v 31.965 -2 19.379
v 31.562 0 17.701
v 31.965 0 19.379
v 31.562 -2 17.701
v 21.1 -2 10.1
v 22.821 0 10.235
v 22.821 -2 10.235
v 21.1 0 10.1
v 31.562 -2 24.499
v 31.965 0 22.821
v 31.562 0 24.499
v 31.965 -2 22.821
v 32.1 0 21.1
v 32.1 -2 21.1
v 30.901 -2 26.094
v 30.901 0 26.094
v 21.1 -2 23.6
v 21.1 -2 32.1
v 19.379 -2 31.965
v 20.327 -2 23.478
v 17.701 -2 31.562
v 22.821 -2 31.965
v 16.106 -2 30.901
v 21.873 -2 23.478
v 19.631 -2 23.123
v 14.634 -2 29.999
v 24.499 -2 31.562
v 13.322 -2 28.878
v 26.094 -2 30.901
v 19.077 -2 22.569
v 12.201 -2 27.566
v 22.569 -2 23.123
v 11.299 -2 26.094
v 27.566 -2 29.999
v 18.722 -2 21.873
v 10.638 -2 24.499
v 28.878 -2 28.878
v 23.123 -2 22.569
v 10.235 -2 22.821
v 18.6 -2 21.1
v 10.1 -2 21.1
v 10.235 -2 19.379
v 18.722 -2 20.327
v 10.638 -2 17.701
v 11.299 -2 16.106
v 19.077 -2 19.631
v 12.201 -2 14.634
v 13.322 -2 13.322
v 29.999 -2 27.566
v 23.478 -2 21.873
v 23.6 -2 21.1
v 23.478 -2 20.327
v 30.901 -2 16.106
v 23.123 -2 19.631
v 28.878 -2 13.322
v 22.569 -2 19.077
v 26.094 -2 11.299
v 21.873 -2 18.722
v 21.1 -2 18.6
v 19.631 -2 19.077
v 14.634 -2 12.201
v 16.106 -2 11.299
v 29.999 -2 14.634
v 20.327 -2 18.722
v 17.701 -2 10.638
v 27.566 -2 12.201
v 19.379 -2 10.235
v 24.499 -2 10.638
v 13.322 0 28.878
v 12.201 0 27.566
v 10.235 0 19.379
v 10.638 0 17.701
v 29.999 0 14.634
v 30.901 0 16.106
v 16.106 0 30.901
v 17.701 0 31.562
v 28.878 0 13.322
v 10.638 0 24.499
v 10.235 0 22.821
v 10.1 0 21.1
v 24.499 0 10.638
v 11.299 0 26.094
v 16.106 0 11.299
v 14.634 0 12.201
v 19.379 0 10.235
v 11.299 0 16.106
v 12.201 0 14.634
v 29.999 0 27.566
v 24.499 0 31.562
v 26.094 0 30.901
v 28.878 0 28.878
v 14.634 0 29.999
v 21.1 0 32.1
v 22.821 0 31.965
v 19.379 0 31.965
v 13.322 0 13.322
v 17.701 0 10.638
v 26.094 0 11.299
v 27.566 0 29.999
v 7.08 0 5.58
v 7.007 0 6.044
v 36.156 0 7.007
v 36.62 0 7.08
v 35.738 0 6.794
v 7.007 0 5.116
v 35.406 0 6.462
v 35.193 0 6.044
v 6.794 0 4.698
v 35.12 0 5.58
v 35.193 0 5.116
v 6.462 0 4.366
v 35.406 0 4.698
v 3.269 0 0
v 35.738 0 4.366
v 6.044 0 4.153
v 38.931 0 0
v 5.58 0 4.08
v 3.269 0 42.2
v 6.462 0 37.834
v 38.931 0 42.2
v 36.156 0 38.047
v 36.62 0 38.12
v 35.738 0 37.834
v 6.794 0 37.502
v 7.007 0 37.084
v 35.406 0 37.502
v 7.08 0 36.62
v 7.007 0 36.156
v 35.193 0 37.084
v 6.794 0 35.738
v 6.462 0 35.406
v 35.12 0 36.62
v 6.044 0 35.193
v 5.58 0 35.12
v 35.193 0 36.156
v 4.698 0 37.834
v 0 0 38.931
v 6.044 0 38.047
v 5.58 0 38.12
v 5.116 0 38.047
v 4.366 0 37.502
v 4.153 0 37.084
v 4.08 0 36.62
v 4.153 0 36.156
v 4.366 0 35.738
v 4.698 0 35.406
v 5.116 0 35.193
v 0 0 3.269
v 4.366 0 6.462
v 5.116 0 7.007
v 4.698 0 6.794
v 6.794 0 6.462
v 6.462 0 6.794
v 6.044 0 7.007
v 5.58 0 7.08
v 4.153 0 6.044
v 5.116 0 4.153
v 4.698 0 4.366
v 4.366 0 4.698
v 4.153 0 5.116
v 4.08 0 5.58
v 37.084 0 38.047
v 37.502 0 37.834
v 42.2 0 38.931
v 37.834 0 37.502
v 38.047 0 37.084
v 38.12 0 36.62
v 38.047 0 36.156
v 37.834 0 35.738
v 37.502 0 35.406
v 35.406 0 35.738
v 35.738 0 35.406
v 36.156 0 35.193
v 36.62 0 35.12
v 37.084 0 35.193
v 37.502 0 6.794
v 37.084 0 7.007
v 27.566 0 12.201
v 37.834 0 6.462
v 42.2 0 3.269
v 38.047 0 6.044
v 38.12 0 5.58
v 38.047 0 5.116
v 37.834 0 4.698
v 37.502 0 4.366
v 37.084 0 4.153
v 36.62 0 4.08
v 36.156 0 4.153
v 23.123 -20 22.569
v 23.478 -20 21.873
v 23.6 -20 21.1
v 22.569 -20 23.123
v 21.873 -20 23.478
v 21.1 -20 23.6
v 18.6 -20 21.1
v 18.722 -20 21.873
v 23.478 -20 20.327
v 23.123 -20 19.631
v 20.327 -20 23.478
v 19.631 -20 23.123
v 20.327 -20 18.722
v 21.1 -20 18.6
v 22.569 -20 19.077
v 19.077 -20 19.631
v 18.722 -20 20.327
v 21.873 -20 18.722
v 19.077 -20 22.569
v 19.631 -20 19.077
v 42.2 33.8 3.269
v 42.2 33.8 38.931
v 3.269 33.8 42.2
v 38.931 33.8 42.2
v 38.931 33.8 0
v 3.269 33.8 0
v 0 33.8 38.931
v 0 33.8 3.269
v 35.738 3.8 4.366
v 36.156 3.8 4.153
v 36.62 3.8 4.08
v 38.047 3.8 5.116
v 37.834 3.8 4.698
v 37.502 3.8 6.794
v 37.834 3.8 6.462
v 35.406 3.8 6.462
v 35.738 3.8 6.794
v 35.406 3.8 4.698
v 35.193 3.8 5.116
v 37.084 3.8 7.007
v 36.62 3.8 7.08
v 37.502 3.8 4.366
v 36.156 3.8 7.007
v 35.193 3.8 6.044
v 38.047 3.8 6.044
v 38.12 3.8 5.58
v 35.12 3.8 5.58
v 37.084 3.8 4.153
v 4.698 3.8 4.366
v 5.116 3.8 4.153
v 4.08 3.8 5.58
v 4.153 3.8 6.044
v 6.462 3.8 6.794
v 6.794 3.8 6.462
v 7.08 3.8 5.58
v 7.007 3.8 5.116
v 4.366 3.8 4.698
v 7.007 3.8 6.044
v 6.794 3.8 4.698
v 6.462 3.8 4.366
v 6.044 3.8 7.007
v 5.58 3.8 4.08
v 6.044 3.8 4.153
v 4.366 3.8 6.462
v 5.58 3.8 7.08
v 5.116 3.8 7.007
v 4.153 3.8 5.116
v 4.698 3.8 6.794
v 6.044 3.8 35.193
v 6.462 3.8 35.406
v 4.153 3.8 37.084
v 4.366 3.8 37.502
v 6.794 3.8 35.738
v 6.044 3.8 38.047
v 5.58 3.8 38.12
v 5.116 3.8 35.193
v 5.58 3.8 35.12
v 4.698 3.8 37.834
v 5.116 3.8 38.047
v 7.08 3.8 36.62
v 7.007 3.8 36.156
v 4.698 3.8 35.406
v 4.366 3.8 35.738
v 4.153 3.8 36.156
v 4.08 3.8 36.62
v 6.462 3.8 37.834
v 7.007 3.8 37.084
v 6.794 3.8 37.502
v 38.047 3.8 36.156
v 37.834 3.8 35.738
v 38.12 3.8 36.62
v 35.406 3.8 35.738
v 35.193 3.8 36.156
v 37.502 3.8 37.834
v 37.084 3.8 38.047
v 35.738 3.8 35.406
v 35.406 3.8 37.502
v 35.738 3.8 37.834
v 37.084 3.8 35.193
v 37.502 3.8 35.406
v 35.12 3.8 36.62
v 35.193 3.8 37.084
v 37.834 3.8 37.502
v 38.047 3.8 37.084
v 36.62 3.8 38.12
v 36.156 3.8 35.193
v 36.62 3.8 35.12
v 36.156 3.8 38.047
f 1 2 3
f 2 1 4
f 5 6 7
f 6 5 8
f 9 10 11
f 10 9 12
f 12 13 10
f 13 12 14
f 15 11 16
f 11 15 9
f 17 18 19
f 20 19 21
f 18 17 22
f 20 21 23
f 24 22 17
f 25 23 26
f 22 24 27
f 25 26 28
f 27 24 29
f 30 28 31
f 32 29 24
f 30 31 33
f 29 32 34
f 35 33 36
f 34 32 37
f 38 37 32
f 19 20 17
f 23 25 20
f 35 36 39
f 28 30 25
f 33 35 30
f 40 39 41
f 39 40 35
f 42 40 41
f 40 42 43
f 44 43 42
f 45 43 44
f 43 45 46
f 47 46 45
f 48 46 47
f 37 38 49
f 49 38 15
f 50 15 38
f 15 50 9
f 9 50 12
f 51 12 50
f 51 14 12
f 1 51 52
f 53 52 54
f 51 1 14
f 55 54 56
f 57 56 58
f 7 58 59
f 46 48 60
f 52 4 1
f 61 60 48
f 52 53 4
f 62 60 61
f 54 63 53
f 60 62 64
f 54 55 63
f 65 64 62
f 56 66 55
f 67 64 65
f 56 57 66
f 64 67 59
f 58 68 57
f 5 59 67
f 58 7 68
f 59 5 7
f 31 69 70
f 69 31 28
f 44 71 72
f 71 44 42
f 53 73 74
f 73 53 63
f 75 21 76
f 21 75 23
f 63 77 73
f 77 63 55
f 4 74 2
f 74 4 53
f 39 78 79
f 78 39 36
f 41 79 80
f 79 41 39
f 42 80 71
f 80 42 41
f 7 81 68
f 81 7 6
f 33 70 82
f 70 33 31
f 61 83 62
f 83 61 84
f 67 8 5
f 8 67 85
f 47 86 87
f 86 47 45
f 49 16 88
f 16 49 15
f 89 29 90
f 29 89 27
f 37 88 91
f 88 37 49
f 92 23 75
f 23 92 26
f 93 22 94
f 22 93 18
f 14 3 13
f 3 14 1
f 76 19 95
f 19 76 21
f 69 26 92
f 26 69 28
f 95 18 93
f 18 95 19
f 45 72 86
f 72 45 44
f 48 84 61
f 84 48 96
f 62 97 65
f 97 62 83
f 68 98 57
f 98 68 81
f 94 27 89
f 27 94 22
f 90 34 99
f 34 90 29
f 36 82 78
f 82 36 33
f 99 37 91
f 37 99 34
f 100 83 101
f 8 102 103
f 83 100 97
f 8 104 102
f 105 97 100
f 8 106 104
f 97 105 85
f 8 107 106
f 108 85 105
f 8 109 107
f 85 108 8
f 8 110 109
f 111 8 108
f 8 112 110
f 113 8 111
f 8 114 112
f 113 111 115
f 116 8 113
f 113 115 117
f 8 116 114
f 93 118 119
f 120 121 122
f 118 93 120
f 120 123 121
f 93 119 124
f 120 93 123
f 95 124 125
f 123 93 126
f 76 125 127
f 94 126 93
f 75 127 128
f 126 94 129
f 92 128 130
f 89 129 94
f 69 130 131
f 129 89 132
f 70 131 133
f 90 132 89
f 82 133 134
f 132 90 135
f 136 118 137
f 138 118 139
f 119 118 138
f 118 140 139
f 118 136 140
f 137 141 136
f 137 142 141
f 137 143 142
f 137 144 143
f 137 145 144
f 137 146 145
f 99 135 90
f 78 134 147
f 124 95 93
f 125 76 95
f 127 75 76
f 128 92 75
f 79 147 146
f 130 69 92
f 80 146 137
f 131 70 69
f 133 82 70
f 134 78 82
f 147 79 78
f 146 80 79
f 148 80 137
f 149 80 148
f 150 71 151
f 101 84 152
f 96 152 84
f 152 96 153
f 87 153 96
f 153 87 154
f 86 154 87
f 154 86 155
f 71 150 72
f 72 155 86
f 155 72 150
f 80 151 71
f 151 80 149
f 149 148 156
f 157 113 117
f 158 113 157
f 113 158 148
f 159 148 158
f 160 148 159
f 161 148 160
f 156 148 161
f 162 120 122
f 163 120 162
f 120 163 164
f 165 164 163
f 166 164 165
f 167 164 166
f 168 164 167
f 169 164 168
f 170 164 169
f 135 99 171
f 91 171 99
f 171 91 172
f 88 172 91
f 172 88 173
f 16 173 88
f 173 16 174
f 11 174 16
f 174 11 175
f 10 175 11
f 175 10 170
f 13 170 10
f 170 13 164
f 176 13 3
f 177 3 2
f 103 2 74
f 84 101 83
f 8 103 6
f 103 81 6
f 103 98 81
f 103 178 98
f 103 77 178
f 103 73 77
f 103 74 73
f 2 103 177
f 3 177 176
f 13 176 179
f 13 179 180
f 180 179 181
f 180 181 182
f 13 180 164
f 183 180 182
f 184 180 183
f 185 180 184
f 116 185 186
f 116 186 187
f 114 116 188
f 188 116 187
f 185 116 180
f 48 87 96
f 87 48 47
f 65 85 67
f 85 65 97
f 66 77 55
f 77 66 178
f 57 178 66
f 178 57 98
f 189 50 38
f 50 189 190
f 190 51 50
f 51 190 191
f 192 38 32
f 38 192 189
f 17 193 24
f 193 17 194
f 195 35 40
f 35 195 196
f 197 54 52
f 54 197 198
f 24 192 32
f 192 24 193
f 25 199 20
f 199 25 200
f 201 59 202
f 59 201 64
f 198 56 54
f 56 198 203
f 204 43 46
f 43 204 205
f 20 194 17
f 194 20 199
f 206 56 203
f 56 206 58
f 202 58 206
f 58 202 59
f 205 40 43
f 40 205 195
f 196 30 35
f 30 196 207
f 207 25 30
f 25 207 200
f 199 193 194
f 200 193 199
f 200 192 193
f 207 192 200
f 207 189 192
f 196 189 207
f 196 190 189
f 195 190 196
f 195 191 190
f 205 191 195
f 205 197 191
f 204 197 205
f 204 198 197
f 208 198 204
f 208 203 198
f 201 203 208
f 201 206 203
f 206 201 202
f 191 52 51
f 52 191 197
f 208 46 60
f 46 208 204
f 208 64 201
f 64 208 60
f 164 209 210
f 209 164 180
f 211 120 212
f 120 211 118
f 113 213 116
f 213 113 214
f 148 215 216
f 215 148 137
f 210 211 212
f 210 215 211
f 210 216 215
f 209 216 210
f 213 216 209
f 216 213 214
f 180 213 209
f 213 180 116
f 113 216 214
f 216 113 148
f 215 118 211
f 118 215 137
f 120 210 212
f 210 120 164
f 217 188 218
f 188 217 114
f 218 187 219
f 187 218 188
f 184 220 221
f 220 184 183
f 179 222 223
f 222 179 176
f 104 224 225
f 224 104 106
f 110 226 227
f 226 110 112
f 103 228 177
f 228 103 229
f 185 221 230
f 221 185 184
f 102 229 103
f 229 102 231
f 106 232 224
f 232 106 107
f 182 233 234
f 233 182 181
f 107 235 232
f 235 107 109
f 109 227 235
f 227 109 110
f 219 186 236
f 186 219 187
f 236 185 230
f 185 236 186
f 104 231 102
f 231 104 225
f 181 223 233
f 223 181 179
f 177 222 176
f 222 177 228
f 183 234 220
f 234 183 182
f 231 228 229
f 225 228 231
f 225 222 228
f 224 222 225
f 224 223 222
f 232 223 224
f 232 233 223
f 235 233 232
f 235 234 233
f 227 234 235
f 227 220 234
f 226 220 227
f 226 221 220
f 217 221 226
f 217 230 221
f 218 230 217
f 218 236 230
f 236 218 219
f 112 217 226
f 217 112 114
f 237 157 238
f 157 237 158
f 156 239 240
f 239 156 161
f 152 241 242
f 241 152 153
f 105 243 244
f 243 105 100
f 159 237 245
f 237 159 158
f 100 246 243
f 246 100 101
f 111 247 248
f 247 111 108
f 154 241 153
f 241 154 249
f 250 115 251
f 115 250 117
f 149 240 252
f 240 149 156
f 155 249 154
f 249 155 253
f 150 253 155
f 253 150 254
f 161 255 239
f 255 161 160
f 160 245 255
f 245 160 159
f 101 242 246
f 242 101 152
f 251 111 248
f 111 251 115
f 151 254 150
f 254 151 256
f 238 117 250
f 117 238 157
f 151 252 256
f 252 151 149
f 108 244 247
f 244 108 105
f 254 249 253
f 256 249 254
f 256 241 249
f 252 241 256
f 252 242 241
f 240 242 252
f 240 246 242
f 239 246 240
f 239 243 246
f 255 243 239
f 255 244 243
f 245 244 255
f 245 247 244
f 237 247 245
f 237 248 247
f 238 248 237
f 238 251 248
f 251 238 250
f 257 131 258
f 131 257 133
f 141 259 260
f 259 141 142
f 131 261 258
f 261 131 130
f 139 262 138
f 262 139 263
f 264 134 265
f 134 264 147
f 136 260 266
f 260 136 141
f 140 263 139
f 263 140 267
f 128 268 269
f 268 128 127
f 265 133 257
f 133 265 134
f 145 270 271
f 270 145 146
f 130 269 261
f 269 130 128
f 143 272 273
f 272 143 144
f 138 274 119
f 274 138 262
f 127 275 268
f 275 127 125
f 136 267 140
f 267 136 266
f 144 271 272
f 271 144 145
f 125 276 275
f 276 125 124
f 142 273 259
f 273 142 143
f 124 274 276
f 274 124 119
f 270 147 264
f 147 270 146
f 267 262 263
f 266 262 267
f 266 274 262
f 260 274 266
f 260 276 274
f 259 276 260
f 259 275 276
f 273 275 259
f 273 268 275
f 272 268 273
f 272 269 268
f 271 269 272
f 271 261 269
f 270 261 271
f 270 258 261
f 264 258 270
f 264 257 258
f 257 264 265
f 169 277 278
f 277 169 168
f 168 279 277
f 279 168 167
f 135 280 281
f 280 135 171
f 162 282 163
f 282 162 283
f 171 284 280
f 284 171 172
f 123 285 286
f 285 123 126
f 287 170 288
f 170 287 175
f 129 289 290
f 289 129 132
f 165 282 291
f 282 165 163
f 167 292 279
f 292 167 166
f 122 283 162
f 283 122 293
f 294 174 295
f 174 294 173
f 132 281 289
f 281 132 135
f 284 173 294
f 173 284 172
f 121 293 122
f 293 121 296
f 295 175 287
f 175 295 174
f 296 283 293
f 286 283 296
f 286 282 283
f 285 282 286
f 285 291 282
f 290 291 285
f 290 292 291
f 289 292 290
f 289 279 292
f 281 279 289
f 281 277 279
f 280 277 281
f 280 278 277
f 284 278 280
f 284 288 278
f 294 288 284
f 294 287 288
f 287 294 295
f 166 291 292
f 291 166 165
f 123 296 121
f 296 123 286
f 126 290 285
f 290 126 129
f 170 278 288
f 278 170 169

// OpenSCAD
// file: nema17.scad
module Nema17()
{
	nema_side = 42.2;
	nema_bolts = 31.04/2.0;
	nema_depth = 3.8;
	M3 = 3.0/2.0;

	//bevel corners
	r1 = nema_side/2- nema_bolts;
	r2 = sqrt(2)* r1 ;
	r=(r2-r1)*2;
	
	
	difference()
	{
	
		union()
		{
			cube([nema_side,33.8,nema_side]);
	
			translate( [nema_side/2,0,nema_side/2]) 
				rotate(90,[1,0,0]) 
					{
						cylinder(r = 11, h = 2, $fn = 40);
						cylinder(r = 5.0/2.0, h = 20, $fn = 20);
					}
		}
	
	
		translate( [nema_side/2,0,nema_side/2])
		{
	
			for(j=[1:4])
			{
				rotate(90*j,[0,1,0]) 
					translate( [nema_side/2,33.8/2,nema_side/2]) 
				rotate(45,[0,1,0]) 
				cube([30,50,r], center = true);
			}
	
			//bolt holes
			for(j=[1:4])
			{		
				rotate(90*j,[0,1,0]) 
				translate( [nema_bolts,0,nema_bolts]) 
					rotate(-90,[1,0,0]) 
					{
						cylinder(r = M3, h = nema_depth*2, $fn = 20,center=true);
					}
	
			}
		}
	}
}
	
	
Nema17();
// main file
//delta.scad

// 2020 extrusion params
alu_height = 7500;
alu_length = 250;

// linear rod
lienarRod_height = 500;
linearRod_distance = 75;


module aluExtrusion(height) {
    //temp..
    translate([0,0,height/2]) cube([20,20,height], center=true);
}

use <nema17.scad>;

module vertex()
{
    height = 40;
    

    Nema17();
    //aluExtrusion(height);
}

vertex();
